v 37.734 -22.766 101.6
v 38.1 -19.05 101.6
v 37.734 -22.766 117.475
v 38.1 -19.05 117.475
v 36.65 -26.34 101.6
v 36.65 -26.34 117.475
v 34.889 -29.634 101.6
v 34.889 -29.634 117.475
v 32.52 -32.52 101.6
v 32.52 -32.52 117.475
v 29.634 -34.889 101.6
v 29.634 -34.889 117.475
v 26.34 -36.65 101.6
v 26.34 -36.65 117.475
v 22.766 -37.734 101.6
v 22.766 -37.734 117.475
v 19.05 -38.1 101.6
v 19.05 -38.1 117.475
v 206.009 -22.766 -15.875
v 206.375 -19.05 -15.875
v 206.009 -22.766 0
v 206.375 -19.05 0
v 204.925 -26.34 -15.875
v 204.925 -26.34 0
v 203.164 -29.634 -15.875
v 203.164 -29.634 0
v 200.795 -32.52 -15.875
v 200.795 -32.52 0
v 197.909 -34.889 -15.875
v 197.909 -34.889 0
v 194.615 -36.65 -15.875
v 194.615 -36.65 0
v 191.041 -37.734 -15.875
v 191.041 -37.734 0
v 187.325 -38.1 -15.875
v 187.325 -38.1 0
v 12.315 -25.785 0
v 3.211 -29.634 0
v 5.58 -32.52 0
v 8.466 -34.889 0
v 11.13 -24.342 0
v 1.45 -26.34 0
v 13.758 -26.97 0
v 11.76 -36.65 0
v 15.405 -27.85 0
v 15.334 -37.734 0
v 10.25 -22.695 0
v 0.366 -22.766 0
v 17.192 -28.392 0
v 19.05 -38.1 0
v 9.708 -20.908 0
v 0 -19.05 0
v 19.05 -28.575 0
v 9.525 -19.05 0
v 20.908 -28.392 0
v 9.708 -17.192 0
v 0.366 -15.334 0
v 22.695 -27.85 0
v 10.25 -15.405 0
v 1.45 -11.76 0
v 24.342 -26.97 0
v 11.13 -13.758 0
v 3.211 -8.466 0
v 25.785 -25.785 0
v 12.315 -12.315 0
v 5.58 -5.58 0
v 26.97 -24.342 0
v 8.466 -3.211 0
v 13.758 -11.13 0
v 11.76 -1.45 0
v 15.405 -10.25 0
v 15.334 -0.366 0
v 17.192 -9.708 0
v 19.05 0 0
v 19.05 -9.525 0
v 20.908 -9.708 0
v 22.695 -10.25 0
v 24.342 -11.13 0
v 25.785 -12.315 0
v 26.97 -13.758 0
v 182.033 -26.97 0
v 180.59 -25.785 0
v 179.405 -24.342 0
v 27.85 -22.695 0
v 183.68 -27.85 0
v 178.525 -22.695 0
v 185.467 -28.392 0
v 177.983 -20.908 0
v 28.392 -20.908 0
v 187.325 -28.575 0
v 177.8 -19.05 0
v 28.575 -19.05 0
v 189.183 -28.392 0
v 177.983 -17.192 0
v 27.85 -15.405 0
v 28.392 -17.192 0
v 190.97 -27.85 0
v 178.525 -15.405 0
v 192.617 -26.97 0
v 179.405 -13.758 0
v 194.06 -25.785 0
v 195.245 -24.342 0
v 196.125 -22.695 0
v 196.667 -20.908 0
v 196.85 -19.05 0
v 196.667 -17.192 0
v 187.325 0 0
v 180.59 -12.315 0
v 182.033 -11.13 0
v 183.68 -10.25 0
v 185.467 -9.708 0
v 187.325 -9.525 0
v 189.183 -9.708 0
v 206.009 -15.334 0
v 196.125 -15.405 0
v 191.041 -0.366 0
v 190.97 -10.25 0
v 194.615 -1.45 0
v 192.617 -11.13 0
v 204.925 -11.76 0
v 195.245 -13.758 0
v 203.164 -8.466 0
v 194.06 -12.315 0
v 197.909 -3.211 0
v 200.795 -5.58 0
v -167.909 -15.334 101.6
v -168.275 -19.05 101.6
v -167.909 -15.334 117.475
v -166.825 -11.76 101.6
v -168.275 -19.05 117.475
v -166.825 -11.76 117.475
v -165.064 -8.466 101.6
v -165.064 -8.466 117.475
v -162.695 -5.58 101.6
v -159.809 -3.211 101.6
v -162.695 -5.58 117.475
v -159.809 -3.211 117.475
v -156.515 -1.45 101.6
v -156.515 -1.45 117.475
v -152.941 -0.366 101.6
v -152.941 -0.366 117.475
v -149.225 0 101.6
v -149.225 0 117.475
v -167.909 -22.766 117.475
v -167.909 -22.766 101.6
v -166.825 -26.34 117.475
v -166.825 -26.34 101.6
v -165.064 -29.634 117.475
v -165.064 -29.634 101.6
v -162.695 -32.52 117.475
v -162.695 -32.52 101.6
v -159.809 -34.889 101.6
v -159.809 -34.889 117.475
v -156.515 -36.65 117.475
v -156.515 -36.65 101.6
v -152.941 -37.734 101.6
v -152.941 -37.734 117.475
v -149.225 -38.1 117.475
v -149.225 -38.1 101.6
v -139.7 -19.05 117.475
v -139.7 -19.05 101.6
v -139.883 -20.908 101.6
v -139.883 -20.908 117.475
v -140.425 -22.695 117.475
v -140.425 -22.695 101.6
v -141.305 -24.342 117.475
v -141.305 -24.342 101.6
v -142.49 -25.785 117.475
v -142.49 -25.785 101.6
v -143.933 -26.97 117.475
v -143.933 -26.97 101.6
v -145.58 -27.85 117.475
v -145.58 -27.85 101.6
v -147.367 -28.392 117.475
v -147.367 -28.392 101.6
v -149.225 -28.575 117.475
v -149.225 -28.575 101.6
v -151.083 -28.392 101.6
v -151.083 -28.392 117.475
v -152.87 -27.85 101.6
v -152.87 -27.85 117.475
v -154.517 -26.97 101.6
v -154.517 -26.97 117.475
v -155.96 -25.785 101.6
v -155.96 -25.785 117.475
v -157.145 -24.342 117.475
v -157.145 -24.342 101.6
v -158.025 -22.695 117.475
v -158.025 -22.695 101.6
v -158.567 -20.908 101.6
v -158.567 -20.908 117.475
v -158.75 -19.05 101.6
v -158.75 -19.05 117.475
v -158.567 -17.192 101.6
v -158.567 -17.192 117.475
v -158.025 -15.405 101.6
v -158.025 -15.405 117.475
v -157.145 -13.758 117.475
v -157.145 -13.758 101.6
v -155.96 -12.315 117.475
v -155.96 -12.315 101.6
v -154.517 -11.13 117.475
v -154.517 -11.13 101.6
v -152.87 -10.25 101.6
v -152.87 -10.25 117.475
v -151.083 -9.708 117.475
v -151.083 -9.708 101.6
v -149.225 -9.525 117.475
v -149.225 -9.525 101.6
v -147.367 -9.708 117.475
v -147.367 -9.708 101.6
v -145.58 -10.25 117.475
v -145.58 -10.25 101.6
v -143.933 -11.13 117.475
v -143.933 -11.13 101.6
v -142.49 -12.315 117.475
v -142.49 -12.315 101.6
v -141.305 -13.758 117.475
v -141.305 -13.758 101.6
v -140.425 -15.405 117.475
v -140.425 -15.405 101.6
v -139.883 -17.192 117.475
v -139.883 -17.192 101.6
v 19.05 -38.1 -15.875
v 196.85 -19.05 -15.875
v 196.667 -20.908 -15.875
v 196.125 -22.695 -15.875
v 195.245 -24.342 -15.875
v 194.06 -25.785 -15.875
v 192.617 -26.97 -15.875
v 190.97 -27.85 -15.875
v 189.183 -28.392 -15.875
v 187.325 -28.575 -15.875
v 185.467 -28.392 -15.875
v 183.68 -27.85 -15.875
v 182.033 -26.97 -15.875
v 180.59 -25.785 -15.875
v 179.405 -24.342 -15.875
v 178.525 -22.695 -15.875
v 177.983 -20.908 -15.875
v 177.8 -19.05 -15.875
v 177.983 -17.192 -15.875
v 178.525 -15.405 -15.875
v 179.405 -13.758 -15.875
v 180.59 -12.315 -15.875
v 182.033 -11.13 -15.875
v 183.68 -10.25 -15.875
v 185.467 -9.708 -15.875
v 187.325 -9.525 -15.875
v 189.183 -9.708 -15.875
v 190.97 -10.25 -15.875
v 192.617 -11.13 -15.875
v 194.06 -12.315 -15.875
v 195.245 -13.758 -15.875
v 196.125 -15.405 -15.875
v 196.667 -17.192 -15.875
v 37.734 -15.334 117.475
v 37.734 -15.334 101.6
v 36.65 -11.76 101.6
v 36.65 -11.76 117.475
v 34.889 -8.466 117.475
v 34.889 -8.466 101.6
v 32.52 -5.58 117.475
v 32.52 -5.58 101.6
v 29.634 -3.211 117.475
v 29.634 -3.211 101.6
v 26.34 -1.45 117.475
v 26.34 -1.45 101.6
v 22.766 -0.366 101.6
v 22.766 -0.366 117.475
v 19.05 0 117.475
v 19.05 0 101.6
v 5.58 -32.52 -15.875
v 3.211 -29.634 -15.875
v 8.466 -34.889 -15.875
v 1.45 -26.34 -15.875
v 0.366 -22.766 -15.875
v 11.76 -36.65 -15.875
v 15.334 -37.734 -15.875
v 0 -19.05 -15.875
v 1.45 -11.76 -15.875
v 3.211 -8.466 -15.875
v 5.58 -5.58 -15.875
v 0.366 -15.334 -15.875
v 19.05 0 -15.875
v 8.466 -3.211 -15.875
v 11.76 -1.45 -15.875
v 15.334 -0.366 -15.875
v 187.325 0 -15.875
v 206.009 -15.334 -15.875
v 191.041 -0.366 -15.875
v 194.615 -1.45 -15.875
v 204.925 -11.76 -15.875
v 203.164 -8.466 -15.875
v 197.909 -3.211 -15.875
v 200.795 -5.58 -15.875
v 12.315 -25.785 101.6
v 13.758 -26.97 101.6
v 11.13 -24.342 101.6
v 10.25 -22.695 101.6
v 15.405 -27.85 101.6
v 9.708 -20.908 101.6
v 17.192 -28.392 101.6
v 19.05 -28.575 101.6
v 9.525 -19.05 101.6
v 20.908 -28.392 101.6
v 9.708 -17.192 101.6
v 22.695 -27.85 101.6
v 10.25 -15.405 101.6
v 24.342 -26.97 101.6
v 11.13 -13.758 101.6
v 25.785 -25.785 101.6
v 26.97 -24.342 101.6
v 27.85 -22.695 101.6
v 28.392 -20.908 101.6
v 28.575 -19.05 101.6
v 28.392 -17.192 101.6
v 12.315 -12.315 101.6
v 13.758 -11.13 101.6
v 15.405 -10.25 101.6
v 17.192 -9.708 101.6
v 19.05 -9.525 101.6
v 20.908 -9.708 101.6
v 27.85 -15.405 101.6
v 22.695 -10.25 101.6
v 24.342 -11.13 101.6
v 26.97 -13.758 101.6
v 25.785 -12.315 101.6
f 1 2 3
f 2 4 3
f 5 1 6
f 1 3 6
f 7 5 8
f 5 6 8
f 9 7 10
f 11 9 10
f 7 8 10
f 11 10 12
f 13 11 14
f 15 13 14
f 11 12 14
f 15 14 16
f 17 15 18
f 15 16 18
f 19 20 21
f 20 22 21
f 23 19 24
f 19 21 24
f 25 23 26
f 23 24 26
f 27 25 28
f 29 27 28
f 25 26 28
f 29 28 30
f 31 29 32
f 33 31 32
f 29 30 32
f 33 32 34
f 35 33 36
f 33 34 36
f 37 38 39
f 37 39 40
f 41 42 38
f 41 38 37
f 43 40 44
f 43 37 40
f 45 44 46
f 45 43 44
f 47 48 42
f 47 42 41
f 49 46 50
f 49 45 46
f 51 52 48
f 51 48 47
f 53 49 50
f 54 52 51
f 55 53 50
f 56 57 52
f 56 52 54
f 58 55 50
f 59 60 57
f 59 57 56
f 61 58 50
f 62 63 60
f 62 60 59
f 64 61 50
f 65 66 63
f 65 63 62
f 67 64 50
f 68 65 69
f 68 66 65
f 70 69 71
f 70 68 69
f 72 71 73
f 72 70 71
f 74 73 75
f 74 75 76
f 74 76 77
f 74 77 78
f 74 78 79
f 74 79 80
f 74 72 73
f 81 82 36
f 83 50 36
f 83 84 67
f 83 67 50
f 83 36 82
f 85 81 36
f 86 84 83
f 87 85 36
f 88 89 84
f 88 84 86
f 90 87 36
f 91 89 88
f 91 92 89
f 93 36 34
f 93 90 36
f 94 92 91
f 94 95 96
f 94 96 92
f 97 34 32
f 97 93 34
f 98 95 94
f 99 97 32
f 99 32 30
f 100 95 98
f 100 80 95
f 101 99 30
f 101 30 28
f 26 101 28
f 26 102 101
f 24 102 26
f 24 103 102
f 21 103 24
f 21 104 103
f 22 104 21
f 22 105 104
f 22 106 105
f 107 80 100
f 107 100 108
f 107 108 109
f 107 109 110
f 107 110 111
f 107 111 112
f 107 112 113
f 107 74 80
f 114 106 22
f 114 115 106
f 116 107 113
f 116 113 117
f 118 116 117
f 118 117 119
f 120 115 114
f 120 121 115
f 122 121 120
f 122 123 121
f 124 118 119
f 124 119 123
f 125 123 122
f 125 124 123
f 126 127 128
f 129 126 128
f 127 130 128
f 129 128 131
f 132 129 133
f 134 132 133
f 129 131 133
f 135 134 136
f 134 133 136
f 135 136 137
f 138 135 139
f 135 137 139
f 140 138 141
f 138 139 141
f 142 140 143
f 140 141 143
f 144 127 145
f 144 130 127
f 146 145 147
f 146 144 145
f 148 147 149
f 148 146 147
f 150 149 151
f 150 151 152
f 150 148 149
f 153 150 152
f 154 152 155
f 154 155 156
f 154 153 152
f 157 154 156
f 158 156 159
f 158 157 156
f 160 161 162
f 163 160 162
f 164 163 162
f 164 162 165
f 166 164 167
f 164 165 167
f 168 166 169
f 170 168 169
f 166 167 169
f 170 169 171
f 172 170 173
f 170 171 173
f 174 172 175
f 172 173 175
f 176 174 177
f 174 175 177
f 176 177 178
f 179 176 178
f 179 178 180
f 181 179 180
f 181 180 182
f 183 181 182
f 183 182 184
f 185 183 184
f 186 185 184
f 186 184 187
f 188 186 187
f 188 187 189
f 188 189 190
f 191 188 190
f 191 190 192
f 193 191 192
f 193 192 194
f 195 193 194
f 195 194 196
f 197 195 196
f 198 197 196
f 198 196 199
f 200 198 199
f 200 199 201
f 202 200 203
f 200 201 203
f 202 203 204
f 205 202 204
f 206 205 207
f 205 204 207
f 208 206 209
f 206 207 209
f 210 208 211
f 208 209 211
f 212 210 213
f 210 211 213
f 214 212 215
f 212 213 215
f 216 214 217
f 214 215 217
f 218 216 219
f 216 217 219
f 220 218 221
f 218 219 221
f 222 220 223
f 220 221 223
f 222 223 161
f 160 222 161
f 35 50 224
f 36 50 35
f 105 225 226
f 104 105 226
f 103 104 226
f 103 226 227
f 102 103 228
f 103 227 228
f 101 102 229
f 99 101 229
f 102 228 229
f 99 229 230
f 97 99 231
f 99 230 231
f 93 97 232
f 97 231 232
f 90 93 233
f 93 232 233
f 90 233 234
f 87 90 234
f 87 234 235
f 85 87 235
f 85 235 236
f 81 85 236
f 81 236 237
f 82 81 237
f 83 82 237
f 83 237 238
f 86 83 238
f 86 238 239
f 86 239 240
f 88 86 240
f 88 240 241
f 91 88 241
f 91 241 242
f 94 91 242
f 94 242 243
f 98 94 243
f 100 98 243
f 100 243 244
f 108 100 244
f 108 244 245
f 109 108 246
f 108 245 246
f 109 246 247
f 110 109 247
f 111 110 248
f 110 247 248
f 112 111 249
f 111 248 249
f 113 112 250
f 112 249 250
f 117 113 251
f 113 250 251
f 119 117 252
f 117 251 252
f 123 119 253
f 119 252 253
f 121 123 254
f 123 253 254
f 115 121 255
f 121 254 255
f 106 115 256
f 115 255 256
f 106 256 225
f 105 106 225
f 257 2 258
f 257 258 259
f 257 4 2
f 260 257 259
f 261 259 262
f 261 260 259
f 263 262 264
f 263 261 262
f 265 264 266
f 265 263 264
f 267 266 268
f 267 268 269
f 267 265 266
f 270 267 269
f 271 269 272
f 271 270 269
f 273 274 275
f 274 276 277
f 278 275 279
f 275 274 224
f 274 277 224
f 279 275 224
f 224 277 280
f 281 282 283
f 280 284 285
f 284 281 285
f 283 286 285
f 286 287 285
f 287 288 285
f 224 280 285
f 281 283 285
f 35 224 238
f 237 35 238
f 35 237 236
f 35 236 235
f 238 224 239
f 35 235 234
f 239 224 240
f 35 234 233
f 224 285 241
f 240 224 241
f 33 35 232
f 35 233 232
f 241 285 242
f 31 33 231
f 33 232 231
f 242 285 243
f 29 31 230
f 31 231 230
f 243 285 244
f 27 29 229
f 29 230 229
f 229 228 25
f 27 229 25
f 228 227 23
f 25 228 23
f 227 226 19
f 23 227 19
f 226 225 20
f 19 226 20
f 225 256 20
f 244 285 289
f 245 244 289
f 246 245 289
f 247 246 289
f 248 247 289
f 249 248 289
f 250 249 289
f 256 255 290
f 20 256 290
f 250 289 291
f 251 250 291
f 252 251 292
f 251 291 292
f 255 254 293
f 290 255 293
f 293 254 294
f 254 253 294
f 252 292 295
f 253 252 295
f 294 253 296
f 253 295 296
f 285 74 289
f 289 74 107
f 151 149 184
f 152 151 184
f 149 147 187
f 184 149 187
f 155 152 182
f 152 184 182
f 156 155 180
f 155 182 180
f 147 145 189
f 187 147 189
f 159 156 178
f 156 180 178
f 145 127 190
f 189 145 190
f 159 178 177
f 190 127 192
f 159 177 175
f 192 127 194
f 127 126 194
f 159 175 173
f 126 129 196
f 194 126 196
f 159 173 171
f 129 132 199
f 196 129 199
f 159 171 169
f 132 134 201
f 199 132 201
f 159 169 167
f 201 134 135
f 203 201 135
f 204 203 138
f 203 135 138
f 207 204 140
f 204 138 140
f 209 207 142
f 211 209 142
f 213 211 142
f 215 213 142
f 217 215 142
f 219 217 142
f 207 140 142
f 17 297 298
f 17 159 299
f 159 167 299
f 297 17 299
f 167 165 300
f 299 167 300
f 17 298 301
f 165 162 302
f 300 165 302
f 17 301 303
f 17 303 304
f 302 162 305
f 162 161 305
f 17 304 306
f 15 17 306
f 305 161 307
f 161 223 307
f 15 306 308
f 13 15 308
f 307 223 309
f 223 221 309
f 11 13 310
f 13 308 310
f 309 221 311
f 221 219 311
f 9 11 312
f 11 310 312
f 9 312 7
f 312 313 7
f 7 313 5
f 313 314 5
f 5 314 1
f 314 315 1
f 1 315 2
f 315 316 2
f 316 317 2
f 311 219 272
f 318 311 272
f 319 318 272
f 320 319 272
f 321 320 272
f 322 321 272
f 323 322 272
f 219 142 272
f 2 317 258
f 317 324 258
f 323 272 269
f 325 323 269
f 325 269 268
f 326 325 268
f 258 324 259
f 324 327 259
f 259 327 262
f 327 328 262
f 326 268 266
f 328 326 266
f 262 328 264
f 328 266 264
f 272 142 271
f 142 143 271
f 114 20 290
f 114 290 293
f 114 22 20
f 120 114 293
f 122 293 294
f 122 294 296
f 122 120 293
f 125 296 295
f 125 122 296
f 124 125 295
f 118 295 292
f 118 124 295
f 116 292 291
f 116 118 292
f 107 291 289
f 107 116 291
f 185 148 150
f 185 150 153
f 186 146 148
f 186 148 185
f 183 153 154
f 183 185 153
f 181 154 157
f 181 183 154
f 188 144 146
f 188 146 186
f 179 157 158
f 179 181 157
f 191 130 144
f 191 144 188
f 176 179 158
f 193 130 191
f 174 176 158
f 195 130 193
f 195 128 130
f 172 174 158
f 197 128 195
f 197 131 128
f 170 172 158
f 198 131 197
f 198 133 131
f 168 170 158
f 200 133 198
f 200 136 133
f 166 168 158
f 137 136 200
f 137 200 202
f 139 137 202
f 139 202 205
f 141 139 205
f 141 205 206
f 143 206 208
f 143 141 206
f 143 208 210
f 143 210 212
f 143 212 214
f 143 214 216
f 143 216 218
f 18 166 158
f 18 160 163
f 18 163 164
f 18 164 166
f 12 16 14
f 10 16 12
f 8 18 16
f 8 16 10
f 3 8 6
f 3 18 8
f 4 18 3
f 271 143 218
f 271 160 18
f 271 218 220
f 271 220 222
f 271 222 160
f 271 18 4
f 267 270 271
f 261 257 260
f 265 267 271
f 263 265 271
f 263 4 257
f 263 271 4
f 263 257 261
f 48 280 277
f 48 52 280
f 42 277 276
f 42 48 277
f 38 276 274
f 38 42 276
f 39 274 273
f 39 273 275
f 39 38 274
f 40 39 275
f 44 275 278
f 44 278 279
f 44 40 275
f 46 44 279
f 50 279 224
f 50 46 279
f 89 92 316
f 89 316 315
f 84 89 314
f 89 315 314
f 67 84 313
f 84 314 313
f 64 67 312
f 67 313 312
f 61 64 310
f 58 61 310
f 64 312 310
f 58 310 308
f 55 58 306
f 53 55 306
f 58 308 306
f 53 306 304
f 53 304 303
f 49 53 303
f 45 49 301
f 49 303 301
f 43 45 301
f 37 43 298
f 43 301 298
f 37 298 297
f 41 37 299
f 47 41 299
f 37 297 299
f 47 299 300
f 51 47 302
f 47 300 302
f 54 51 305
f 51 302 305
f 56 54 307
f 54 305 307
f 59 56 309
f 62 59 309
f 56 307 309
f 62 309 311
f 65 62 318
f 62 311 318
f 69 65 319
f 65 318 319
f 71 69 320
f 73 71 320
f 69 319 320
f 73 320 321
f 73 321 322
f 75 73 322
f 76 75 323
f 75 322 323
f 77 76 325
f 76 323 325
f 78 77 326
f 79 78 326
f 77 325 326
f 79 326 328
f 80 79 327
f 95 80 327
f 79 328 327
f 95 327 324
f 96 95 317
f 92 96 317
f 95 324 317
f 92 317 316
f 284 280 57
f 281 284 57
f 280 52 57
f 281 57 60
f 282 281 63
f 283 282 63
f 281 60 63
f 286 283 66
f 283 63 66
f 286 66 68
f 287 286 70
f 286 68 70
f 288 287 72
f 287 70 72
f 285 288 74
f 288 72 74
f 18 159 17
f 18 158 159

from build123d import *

# Parameters (mm, degrees)
F0_W     = 206.375
F0_H     = 15.875
F1_DEPTH = 38.1
F2_R     = 19.04999
F3_R     = 19.04999
F4_R     = 9.525
F5_DEPTH = 101.6
F6_R     = 9.525
F7_DEPTH = 25.4
F8_R     = 9.525
F9_DEPTH = 25.4


# Not quite as in the source:
# - a fillet or chamfer is up to 0.001 mm smaller than in the source, because OpenCascade refuses the exact size


with BuildPart() as f1:
    # F0 (on Front) → F1 (new body)
    with BuildSketch(Plane.XZ):
        with Locations((103.1875, -7.9375)):
            Rectangle(F0_W, F0_H)
    extrude(amount=F1_DEPTH)

    # F3 (radius 19.05 in the source; OpenCascade refuses exactly that, so slightly less here)
    f3_edges = [f1.edges().sort_by_distance(p)[0] for p in [
        (0, -38.1, -7.9375),
        (206.375, -38.1, -7.9375),
        (206.375, 0, -7.9375),
        (0, 0, -7.9375),
    ]]
    fillet(f3_edges, radius=F3_R)



with BuildPart() as f1b:
    # F0 (on Front) → F1, piece 2 (new body)
    with BuildSketch(Plane.XZ):
        with Locations((-65.0875, 109.5375)):
            Rectangle(F0_W, F0_H)
    extrude(amount=F1_DEPTH)

    # F2 (radius 19.05 in the source; OpenCascade refuses exactly that, so slightly less here)
    f2_edges = [f1b.edges().sort_by_distance(p)[0] for p in [
        (-168.275, -38.1, 109.5375),
        (-168.275, 0, 109.5375),
        (38.1, -38.1, 109.5375),
        (38.1, 0, 109.5375),
    ]]
    fillet(f2_edges, radius=F2_R)


with BuildPart() as f1_1:
    add(f1.part)

    add(f1b.part)  # F5 merges F1b
    # F4 (on face) → F5 (join)
    with BuildSketch(Plane(origin=(0, 0, 101.6), x_dir=(1, 0, 0), z_dir=(0, 0, -1))):
        with Locations((19.05, 19.05)):
            Circle(F4_R)
    extrude(amount=F5_DEPTH)

    # F6 (on face) → F7 (cut)
    with BuildSketch(Plane(origin=(0, 0, 101.6), x_dir=(1, 0, 0), z_dir=(0, 0, -1))):
        with Locations((-149.225, 19.05)):
            Circle(F6_R)
    extrude(amount=-F7_DEPTH, mode=Mode.SUBTRACT)

    # F8 (on face) → F9 (cut)
    with BuildSketch(Plane(origin=(0, 0, -15.875), x_dir=(1, 0, 0), z_dir=(0, 0, -1))):
        with Locations((187.325, 19.05)):
            Circle(F8_R)
    extrude(amount=-F9_DEPTH, mode=Mode.SUBTRACT)


solid = f1_1.part
